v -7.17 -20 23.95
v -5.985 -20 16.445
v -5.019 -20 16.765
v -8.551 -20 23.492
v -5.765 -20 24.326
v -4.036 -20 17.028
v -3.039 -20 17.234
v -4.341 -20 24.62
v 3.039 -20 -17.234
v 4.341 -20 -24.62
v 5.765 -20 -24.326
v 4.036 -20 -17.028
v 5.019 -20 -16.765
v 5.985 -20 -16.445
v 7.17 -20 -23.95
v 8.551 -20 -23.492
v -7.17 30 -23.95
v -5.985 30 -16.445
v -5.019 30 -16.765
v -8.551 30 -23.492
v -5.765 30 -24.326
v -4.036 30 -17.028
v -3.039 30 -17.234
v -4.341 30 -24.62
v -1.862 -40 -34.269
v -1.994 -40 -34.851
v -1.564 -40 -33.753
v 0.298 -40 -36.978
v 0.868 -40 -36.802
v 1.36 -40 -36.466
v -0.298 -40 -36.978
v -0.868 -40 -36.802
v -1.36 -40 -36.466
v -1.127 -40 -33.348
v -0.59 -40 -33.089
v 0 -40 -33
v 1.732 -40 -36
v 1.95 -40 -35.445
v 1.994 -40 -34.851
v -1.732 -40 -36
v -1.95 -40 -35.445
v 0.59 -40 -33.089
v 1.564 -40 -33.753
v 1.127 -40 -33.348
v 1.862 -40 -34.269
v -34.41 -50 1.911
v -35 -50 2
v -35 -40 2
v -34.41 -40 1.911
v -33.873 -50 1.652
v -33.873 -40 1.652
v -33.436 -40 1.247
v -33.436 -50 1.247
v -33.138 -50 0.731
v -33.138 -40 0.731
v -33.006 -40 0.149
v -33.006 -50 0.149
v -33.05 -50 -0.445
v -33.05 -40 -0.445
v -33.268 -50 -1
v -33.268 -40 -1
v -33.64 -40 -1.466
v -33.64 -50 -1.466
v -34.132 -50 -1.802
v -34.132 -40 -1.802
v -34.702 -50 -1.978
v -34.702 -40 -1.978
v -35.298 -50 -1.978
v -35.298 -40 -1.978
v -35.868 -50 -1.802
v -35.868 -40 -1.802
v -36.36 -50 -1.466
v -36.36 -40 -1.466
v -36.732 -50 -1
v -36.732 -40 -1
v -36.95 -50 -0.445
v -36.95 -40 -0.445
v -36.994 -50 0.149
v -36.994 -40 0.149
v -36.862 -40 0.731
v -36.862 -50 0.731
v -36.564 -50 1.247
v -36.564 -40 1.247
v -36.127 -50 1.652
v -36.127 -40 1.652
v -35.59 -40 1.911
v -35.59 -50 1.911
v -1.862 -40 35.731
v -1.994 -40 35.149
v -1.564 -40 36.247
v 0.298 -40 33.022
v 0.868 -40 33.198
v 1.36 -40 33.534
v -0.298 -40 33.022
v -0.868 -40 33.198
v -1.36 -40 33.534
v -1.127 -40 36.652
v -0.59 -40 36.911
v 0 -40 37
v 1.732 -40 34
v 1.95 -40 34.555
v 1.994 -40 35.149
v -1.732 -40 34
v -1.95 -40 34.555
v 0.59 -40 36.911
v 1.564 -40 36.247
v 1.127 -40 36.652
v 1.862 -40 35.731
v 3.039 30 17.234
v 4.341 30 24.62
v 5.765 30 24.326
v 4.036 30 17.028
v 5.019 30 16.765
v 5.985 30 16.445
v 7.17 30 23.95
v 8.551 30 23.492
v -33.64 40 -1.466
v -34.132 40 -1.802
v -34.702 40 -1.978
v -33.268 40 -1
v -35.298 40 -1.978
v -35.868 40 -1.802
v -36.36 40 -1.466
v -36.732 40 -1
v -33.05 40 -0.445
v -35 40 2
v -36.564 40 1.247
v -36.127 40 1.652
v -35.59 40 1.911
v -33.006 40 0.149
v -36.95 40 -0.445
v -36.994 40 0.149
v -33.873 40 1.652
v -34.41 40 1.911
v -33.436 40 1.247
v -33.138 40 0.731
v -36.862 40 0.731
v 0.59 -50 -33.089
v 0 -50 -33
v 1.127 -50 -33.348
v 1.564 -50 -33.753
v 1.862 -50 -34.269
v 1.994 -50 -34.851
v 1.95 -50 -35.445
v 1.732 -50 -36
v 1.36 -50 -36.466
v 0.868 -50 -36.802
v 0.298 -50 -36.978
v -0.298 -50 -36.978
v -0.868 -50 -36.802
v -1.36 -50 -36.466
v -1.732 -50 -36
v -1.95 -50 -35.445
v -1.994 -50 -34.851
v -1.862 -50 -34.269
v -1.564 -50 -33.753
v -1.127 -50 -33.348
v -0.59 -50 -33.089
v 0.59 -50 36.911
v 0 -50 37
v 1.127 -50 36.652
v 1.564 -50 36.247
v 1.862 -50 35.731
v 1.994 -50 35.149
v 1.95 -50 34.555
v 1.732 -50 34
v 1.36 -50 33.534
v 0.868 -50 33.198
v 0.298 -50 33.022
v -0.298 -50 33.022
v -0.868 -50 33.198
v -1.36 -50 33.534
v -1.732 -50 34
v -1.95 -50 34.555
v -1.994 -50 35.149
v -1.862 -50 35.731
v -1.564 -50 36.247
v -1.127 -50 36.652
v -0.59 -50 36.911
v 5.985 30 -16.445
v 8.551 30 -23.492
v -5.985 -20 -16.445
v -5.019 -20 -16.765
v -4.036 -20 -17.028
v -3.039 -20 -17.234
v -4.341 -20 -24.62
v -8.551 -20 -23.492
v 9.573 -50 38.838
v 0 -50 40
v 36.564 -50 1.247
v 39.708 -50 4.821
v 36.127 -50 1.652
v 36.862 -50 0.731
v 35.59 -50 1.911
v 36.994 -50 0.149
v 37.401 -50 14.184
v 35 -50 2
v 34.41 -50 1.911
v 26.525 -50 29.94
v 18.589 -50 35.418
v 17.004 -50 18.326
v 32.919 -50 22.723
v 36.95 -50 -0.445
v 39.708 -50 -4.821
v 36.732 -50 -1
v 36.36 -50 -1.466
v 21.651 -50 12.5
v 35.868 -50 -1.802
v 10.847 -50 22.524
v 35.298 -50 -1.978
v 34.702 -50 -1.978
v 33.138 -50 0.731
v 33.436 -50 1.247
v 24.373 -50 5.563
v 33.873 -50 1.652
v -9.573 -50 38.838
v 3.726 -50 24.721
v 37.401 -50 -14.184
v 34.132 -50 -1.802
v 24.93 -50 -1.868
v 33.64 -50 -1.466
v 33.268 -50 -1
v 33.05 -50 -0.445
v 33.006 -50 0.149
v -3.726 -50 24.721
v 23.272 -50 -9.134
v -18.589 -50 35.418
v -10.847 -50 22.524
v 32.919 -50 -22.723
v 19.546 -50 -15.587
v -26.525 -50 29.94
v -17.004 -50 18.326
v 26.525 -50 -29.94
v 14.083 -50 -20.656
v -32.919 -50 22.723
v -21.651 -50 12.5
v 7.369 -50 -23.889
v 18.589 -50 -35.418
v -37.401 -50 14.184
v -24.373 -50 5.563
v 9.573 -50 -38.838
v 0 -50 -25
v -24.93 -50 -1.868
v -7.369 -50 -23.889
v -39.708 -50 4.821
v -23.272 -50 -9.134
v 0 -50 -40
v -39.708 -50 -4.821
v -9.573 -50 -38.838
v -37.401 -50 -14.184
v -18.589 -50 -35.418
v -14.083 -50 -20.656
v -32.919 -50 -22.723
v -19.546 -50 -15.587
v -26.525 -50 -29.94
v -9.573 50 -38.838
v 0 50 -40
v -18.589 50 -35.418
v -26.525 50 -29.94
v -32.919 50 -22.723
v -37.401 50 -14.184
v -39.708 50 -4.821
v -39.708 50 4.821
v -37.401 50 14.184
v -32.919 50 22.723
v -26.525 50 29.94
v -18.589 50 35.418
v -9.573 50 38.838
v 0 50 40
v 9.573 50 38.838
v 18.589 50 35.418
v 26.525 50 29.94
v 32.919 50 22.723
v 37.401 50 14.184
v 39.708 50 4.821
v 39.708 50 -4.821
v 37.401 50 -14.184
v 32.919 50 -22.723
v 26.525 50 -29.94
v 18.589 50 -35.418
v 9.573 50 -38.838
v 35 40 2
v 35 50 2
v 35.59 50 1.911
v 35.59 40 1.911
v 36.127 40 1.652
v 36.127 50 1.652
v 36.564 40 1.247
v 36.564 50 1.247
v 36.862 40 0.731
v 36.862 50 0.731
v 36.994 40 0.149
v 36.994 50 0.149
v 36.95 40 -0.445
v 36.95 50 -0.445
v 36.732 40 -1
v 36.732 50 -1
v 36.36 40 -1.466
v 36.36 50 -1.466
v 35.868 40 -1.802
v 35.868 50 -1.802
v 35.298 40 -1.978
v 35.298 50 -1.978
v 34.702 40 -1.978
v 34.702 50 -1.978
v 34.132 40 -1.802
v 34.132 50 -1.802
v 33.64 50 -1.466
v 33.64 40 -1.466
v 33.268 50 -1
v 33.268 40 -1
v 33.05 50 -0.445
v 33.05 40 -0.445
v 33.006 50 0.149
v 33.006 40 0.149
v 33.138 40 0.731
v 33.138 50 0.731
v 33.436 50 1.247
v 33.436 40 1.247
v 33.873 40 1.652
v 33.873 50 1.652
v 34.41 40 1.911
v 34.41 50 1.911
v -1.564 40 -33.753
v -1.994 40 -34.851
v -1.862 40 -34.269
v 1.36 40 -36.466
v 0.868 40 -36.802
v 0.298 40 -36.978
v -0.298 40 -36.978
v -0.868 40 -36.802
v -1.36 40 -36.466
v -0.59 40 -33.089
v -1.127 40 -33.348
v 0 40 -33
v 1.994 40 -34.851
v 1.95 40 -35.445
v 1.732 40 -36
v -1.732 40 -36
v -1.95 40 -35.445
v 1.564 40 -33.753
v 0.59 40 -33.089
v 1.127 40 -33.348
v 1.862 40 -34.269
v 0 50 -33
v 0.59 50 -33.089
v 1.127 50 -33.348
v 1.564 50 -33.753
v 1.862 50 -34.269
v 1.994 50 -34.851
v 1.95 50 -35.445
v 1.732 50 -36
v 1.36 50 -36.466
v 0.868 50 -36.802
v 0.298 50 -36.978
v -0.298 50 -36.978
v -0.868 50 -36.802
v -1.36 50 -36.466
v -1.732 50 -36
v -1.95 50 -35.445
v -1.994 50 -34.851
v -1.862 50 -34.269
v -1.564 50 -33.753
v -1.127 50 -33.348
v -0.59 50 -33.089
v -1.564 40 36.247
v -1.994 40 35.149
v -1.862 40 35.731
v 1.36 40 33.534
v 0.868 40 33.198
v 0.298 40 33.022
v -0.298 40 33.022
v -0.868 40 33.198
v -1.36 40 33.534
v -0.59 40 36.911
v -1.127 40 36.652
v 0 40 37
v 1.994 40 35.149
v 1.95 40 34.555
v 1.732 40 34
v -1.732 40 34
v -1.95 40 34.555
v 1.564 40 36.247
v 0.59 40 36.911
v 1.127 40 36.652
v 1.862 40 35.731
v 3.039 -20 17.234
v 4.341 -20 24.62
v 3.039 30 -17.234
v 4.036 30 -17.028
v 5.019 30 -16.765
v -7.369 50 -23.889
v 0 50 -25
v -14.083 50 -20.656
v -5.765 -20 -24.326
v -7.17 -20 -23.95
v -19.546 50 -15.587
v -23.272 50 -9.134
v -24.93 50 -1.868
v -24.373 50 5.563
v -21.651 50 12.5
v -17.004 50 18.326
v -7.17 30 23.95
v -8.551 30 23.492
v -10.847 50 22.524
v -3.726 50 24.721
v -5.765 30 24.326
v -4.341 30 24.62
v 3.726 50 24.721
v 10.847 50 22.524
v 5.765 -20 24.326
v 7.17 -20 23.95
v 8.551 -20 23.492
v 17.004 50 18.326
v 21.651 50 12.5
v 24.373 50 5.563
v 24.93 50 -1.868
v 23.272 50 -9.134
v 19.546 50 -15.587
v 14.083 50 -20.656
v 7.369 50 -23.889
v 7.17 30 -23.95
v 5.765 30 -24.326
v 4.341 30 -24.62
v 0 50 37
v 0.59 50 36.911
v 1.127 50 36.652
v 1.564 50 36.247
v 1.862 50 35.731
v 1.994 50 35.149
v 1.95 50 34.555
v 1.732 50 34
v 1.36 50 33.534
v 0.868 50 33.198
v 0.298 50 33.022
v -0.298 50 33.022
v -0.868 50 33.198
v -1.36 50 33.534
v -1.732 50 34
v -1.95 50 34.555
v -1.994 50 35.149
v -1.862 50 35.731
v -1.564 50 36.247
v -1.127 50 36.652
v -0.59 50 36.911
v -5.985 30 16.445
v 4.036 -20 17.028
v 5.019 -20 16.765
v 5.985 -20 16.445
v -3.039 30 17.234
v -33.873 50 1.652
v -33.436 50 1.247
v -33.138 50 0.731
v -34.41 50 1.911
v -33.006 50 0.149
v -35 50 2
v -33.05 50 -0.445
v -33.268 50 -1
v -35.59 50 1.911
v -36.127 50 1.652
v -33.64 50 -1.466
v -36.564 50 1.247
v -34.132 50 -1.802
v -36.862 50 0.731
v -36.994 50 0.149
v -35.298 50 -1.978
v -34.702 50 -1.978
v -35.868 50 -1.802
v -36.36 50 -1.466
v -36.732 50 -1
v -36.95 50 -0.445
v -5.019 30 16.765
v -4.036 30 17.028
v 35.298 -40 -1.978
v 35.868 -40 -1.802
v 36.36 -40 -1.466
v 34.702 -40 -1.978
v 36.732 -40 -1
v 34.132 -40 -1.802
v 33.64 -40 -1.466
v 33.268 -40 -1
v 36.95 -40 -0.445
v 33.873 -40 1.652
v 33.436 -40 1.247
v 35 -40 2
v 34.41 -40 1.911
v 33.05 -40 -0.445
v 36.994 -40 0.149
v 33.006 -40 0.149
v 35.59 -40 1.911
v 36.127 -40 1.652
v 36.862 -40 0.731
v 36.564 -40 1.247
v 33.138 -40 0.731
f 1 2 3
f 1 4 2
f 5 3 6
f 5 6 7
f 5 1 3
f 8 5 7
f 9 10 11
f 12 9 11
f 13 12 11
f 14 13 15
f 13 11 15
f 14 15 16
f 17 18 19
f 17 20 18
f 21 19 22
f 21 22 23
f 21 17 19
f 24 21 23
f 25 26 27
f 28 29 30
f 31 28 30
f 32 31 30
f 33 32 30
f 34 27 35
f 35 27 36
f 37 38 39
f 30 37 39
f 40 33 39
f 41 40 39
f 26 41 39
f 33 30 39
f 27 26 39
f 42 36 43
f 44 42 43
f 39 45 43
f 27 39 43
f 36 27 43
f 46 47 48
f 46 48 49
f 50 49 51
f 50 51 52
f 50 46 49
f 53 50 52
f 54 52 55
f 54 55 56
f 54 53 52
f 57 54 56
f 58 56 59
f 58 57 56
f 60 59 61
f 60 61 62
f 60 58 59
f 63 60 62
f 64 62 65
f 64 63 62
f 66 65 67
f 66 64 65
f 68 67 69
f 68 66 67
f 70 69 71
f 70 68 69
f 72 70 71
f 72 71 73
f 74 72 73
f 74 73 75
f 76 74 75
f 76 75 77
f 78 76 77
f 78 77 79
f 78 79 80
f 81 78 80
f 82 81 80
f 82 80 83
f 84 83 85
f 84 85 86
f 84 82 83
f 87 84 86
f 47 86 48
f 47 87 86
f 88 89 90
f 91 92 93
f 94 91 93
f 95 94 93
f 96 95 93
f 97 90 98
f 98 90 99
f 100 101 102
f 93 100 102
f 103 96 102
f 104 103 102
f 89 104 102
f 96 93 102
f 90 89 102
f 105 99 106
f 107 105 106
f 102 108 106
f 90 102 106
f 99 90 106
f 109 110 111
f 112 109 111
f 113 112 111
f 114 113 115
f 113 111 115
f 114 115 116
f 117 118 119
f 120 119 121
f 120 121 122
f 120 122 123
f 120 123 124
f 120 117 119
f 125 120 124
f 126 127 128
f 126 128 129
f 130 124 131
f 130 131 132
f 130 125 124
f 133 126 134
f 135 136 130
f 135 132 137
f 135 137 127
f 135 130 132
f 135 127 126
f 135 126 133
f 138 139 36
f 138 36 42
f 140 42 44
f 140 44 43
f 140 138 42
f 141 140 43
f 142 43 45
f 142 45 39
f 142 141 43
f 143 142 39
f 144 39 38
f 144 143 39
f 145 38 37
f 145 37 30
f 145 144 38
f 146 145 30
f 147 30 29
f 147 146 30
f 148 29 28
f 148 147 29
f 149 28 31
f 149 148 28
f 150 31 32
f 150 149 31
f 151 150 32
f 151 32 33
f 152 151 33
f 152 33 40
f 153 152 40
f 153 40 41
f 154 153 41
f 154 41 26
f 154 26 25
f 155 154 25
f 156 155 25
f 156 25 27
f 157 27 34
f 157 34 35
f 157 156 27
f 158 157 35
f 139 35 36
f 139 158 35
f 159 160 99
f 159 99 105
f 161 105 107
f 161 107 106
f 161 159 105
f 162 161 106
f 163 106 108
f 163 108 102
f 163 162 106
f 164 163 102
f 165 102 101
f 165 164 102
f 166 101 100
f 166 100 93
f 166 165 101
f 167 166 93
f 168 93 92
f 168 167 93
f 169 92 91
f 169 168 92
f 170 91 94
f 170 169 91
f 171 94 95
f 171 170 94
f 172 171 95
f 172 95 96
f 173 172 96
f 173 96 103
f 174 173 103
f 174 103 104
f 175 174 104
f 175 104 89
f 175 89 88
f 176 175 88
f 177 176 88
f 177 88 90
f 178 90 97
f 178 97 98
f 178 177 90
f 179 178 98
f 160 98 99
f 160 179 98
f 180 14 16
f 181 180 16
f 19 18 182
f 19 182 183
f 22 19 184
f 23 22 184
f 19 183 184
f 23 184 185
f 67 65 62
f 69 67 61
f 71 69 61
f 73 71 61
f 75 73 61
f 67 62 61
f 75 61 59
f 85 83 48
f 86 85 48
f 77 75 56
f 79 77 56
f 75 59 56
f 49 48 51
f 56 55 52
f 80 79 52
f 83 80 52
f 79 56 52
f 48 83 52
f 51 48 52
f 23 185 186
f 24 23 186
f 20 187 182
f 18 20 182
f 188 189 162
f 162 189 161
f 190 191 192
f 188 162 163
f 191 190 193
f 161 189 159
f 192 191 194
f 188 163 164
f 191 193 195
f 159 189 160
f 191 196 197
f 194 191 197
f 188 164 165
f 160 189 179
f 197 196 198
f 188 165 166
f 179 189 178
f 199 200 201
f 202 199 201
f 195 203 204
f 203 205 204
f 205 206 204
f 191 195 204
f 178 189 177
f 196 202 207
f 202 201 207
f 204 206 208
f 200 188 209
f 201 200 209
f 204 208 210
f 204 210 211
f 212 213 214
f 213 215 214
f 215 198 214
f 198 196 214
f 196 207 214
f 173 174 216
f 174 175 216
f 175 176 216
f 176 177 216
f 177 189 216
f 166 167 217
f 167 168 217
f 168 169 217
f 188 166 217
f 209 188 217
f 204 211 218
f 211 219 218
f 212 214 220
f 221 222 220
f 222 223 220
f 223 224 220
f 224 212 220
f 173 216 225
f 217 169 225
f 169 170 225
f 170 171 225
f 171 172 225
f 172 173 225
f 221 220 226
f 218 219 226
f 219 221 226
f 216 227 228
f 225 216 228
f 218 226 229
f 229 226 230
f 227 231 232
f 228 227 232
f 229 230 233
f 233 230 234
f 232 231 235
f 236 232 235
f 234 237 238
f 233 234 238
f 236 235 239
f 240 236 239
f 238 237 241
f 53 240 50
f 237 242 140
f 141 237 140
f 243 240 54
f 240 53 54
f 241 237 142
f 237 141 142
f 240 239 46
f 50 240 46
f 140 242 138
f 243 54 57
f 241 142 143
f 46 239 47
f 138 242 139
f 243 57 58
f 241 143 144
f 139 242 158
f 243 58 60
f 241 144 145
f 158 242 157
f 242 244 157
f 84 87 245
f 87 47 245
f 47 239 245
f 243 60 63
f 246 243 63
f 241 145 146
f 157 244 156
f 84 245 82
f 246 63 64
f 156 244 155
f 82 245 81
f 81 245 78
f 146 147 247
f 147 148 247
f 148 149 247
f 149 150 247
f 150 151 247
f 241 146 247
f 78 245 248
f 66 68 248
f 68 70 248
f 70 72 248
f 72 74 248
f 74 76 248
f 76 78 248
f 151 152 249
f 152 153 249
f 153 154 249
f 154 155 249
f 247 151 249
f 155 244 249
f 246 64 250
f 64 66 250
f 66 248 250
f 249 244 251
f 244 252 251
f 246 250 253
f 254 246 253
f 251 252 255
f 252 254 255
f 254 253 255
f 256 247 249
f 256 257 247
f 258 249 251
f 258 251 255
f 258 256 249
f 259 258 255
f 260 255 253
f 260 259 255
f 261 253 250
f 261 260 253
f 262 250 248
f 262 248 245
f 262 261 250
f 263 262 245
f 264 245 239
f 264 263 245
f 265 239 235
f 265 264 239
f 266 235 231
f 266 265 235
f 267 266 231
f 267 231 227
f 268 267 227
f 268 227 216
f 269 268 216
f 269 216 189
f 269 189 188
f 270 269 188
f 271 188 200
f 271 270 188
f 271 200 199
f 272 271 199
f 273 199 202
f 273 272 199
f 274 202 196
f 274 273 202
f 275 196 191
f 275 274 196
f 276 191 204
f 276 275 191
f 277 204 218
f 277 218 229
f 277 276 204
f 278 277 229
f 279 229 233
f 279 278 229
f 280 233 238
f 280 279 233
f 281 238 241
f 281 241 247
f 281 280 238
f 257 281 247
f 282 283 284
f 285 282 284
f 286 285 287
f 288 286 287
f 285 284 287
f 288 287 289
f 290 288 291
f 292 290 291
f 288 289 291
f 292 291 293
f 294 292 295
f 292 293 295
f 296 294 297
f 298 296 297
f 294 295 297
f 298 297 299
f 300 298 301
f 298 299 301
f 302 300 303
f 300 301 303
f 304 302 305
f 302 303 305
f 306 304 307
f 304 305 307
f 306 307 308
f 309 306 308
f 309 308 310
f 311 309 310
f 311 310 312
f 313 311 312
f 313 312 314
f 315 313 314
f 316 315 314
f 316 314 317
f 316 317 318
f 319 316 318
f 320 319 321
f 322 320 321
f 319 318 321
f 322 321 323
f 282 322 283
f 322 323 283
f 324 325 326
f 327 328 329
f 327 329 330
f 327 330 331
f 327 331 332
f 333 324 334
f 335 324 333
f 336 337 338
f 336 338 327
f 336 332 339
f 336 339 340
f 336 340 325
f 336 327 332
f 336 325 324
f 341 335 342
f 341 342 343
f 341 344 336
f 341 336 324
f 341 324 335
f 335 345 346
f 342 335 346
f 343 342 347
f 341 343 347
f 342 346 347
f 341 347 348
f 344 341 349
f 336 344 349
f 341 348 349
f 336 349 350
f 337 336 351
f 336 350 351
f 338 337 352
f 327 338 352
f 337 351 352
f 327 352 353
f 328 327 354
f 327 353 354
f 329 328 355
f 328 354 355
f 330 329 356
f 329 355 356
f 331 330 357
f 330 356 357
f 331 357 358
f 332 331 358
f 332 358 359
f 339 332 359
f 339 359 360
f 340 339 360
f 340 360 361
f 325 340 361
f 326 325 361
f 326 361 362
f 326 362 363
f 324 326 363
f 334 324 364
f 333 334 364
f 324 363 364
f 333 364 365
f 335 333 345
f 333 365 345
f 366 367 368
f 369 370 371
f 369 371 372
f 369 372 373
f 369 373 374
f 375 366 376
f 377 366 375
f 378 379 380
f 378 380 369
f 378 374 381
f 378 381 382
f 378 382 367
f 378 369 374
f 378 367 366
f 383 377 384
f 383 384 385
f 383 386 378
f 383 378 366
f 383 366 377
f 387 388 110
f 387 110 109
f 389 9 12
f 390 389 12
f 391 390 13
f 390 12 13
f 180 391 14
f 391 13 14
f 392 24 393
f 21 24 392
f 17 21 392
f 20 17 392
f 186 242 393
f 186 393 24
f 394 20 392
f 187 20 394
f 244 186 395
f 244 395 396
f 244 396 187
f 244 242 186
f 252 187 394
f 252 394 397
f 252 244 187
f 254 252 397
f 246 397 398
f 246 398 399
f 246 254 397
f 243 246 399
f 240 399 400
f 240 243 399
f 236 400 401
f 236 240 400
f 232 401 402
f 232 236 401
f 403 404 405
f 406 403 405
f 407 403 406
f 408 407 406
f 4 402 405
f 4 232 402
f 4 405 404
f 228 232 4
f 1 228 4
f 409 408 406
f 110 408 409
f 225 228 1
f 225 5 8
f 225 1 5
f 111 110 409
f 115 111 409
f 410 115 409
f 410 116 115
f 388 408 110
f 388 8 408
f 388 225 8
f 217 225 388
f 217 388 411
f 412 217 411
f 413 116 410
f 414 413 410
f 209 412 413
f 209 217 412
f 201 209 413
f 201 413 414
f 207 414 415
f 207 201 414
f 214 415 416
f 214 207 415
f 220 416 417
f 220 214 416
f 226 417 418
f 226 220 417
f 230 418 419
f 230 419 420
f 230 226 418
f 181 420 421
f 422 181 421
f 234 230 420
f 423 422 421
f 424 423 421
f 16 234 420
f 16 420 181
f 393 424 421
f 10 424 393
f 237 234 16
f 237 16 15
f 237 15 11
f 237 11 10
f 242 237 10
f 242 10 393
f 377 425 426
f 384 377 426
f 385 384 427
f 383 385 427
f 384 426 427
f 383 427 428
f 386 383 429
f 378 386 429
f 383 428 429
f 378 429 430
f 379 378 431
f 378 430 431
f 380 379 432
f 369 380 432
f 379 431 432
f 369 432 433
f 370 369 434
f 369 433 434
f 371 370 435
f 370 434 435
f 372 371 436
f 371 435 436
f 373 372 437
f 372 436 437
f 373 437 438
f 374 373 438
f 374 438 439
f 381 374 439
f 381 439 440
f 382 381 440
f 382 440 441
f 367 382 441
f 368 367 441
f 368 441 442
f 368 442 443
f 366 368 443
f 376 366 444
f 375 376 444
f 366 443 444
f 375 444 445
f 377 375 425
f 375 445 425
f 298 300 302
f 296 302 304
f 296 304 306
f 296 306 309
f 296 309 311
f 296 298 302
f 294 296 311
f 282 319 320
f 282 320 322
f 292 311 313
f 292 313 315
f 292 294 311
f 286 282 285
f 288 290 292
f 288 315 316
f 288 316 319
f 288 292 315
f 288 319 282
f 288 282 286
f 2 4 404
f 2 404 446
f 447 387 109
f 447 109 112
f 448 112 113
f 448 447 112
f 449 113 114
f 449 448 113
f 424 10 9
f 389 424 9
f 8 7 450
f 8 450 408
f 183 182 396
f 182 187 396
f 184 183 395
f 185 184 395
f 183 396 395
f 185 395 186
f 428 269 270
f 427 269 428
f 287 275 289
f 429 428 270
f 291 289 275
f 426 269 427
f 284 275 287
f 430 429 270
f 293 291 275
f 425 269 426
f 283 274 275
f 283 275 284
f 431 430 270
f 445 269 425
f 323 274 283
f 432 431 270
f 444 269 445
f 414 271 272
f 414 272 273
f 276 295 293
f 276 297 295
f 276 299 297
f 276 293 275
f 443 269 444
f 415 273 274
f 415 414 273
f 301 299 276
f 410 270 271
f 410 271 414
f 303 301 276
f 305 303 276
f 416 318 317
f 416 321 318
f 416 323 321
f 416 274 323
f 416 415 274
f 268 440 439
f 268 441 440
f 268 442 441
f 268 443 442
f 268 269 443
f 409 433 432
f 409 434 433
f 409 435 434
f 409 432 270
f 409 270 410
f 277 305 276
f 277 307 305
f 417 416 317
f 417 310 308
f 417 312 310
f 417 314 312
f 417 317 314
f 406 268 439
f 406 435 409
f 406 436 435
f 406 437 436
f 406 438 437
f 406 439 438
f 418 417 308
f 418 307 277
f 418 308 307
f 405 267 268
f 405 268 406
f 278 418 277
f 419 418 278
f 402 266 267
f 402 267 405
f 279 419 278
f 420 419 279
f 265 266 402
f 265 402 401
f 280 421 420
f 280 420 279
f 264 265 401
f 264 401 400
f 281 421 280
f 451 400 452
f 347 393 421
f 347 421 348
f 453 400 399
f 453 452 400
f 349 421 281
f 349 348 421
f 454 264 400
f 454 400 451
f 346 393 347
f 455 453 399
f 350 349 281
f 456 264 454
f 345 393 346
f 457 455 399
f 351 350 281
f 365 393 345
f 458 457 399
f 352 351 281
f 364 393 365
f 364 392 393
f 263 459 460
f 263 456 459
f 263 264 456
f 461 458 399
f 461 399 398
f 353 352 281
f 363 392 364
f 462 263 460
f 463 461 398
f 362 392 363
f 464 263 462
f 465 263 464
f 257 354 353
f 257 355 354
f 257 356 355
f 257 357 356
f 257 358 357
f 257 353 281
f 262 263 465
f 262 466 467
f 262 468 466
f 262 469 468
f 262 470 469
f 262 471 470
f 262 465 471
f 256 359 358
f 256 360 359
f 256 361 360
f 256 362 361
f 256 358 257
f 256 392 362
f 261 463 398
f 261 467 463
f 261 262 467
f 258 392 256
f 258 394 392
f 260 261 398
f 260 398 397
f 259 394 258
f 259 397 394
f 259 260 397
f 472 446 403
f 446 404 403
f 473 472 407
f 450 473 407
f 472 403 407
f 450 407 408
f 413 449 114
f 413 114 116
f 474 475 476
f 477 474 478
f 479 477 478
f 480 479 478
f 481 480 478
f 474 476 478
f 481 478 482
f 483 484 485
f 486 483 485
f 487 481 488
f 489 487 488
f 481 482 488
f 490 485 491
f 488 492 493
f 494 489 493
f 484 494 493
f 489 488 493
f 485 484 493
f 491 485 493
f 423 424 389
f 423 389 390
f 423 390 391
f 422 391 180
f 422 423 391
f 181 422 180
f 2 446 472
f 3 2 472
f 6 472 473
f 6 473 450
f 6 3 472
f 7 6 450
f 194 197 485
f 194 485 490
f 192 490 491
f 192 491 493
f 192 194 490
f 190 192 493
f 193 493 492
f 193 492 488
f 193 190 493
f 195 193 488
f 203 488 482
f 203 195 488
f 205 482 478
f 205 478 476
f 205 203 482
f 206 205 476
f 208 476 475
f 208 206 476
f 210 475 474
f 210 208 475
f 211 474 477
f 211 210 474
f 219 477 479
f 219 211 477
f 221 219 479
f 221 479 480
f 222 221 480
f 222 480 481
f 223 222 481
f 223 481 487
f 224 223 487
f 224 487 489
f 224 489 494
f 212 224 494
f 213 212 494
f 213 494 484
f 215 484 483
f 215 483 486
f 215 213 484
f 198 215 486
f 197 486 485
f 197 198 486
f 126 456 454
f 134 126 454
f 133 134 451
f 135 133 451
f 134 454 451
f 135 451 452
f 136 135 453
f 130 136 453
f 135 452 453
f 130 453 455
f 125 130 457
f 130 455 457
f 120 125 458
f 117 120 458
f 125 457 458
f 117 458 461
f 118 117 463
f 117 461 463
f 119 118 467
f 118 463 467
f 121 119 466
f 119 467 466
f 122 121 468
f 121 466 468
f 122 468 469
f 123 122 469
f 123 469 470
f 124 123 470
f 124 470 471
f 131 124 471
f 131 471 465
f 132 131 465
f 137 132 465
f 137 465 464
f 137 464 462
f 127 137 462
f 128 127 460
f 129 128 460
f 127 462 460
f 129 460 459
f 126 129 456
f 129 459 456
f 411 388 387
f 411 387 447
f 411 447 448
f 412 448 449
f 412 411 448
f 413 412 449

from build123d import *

# Parameters (mm, degrees)
SKETCH1_R           = 40
SKETCH1_R_2         = 25
BOSS_EXTRUDE1_DEPTH = 50
SKETCH2_R           = 2
CUT_EXTRUDE1_DEPTH  = 10
BOSS_EXTRUDE2_START = -30
BOSS_EXTRUDE2_DEPTH = 50


with BuildPart() as part:
    # Sketch1 → Boss-Extrude1 (new, symmetric)
    with BuildSketch(Plane(origin=(0, 0, 0), x_dir=(1, 0, 0), z_dir=(0, 1, 0))):
        with Locations(Location((0, 0, 0), (0, 0, 90))):
            Circle(SKETCH1_R)
        with Locations(Location((0, 0, 0), (0, 0, 90))):
            Circle(SKETCH1_R_2, mode=Mode.SUBTRACT)
    extrude(amount=BOSS_EXTRUDE1_DEPTH, both=True)

    # Sketch2 → Cut-Extrude1 (cut)
    with BuildSketch(Plane(origin=(0, 50, 0), x_dir=(1, 0, 0), z_dir=(0, 1, 0))):
        with Locations(Location((0, 35, 0), (0, 0, 270))):
            Circle(SKETCH2_R)
        with Locations(Location((35, 0, 0), (0, 0, 270))):
            Circle(SKETCH2_R)
        with Locations(Location((0, -35, 0), (0, 0, 270))):
            Circle(SKETCH2_R)
        with Locations(Location((-35, 0, 0), (0, 0, 270))):
            Circle(SKETCH2_R)
    cut_extrude1 = extrude(amount=-CUT_EXTRUDE1_DEPTH, mode=Mode.SUBTRACT)

    # Mirror1: Cut-Extrude1 across plane
    add(cut_extrude1.mirror(Plane.ZX), mode=Mode.SUBTRACT)

    # Sketch3 → Boss-Extrude2 (add)
    with BuildSketch(Plane.XZ.offset(50).offset(BOSS_EXTRUDE2_START)):
        with BuildLine():
            ThreePointArc((-5.985352508, 16.444620864), (-4.529333289, 16.90370196), (-3.038843109, 17.234135678))
            Line((-3.038843109, 17.234135678), (-4.341204442, 24.620193825))
            ThreePointArc((-4.341204442, 24.620193825), (-6.470476128, 24.148145657), (-8.550503583, 23.49231552))
            Line((-8.550503583, 23.49231552), (-5.985352508, 16.444620864))
        make_face()
        with BuildLine():
            Line((4.341204442, 24.620193825), (3.038843109, 17.234135678))
            ThreePointArc((3.038843109, 17.234135678), (4.529333289, 16.90370196), (5.985352508, 16.444620864))
            Line((5.985352508, 16.444620864), (8.550503583, 23.49231552))
            ThreePointArc((8.550503583, 23.49231552), (6.470476128, 24.148145657), (4.341204442, 24.620193825))
        make_face()
    boss_extrude2 = extrude(amount=-BOSS_EXTRUDE2_DEPTH)

    # Mirror2: Boss-Extrude2 across plane
    add(boss_extrude2.mirror(Plane.XY))


solid = part.part
